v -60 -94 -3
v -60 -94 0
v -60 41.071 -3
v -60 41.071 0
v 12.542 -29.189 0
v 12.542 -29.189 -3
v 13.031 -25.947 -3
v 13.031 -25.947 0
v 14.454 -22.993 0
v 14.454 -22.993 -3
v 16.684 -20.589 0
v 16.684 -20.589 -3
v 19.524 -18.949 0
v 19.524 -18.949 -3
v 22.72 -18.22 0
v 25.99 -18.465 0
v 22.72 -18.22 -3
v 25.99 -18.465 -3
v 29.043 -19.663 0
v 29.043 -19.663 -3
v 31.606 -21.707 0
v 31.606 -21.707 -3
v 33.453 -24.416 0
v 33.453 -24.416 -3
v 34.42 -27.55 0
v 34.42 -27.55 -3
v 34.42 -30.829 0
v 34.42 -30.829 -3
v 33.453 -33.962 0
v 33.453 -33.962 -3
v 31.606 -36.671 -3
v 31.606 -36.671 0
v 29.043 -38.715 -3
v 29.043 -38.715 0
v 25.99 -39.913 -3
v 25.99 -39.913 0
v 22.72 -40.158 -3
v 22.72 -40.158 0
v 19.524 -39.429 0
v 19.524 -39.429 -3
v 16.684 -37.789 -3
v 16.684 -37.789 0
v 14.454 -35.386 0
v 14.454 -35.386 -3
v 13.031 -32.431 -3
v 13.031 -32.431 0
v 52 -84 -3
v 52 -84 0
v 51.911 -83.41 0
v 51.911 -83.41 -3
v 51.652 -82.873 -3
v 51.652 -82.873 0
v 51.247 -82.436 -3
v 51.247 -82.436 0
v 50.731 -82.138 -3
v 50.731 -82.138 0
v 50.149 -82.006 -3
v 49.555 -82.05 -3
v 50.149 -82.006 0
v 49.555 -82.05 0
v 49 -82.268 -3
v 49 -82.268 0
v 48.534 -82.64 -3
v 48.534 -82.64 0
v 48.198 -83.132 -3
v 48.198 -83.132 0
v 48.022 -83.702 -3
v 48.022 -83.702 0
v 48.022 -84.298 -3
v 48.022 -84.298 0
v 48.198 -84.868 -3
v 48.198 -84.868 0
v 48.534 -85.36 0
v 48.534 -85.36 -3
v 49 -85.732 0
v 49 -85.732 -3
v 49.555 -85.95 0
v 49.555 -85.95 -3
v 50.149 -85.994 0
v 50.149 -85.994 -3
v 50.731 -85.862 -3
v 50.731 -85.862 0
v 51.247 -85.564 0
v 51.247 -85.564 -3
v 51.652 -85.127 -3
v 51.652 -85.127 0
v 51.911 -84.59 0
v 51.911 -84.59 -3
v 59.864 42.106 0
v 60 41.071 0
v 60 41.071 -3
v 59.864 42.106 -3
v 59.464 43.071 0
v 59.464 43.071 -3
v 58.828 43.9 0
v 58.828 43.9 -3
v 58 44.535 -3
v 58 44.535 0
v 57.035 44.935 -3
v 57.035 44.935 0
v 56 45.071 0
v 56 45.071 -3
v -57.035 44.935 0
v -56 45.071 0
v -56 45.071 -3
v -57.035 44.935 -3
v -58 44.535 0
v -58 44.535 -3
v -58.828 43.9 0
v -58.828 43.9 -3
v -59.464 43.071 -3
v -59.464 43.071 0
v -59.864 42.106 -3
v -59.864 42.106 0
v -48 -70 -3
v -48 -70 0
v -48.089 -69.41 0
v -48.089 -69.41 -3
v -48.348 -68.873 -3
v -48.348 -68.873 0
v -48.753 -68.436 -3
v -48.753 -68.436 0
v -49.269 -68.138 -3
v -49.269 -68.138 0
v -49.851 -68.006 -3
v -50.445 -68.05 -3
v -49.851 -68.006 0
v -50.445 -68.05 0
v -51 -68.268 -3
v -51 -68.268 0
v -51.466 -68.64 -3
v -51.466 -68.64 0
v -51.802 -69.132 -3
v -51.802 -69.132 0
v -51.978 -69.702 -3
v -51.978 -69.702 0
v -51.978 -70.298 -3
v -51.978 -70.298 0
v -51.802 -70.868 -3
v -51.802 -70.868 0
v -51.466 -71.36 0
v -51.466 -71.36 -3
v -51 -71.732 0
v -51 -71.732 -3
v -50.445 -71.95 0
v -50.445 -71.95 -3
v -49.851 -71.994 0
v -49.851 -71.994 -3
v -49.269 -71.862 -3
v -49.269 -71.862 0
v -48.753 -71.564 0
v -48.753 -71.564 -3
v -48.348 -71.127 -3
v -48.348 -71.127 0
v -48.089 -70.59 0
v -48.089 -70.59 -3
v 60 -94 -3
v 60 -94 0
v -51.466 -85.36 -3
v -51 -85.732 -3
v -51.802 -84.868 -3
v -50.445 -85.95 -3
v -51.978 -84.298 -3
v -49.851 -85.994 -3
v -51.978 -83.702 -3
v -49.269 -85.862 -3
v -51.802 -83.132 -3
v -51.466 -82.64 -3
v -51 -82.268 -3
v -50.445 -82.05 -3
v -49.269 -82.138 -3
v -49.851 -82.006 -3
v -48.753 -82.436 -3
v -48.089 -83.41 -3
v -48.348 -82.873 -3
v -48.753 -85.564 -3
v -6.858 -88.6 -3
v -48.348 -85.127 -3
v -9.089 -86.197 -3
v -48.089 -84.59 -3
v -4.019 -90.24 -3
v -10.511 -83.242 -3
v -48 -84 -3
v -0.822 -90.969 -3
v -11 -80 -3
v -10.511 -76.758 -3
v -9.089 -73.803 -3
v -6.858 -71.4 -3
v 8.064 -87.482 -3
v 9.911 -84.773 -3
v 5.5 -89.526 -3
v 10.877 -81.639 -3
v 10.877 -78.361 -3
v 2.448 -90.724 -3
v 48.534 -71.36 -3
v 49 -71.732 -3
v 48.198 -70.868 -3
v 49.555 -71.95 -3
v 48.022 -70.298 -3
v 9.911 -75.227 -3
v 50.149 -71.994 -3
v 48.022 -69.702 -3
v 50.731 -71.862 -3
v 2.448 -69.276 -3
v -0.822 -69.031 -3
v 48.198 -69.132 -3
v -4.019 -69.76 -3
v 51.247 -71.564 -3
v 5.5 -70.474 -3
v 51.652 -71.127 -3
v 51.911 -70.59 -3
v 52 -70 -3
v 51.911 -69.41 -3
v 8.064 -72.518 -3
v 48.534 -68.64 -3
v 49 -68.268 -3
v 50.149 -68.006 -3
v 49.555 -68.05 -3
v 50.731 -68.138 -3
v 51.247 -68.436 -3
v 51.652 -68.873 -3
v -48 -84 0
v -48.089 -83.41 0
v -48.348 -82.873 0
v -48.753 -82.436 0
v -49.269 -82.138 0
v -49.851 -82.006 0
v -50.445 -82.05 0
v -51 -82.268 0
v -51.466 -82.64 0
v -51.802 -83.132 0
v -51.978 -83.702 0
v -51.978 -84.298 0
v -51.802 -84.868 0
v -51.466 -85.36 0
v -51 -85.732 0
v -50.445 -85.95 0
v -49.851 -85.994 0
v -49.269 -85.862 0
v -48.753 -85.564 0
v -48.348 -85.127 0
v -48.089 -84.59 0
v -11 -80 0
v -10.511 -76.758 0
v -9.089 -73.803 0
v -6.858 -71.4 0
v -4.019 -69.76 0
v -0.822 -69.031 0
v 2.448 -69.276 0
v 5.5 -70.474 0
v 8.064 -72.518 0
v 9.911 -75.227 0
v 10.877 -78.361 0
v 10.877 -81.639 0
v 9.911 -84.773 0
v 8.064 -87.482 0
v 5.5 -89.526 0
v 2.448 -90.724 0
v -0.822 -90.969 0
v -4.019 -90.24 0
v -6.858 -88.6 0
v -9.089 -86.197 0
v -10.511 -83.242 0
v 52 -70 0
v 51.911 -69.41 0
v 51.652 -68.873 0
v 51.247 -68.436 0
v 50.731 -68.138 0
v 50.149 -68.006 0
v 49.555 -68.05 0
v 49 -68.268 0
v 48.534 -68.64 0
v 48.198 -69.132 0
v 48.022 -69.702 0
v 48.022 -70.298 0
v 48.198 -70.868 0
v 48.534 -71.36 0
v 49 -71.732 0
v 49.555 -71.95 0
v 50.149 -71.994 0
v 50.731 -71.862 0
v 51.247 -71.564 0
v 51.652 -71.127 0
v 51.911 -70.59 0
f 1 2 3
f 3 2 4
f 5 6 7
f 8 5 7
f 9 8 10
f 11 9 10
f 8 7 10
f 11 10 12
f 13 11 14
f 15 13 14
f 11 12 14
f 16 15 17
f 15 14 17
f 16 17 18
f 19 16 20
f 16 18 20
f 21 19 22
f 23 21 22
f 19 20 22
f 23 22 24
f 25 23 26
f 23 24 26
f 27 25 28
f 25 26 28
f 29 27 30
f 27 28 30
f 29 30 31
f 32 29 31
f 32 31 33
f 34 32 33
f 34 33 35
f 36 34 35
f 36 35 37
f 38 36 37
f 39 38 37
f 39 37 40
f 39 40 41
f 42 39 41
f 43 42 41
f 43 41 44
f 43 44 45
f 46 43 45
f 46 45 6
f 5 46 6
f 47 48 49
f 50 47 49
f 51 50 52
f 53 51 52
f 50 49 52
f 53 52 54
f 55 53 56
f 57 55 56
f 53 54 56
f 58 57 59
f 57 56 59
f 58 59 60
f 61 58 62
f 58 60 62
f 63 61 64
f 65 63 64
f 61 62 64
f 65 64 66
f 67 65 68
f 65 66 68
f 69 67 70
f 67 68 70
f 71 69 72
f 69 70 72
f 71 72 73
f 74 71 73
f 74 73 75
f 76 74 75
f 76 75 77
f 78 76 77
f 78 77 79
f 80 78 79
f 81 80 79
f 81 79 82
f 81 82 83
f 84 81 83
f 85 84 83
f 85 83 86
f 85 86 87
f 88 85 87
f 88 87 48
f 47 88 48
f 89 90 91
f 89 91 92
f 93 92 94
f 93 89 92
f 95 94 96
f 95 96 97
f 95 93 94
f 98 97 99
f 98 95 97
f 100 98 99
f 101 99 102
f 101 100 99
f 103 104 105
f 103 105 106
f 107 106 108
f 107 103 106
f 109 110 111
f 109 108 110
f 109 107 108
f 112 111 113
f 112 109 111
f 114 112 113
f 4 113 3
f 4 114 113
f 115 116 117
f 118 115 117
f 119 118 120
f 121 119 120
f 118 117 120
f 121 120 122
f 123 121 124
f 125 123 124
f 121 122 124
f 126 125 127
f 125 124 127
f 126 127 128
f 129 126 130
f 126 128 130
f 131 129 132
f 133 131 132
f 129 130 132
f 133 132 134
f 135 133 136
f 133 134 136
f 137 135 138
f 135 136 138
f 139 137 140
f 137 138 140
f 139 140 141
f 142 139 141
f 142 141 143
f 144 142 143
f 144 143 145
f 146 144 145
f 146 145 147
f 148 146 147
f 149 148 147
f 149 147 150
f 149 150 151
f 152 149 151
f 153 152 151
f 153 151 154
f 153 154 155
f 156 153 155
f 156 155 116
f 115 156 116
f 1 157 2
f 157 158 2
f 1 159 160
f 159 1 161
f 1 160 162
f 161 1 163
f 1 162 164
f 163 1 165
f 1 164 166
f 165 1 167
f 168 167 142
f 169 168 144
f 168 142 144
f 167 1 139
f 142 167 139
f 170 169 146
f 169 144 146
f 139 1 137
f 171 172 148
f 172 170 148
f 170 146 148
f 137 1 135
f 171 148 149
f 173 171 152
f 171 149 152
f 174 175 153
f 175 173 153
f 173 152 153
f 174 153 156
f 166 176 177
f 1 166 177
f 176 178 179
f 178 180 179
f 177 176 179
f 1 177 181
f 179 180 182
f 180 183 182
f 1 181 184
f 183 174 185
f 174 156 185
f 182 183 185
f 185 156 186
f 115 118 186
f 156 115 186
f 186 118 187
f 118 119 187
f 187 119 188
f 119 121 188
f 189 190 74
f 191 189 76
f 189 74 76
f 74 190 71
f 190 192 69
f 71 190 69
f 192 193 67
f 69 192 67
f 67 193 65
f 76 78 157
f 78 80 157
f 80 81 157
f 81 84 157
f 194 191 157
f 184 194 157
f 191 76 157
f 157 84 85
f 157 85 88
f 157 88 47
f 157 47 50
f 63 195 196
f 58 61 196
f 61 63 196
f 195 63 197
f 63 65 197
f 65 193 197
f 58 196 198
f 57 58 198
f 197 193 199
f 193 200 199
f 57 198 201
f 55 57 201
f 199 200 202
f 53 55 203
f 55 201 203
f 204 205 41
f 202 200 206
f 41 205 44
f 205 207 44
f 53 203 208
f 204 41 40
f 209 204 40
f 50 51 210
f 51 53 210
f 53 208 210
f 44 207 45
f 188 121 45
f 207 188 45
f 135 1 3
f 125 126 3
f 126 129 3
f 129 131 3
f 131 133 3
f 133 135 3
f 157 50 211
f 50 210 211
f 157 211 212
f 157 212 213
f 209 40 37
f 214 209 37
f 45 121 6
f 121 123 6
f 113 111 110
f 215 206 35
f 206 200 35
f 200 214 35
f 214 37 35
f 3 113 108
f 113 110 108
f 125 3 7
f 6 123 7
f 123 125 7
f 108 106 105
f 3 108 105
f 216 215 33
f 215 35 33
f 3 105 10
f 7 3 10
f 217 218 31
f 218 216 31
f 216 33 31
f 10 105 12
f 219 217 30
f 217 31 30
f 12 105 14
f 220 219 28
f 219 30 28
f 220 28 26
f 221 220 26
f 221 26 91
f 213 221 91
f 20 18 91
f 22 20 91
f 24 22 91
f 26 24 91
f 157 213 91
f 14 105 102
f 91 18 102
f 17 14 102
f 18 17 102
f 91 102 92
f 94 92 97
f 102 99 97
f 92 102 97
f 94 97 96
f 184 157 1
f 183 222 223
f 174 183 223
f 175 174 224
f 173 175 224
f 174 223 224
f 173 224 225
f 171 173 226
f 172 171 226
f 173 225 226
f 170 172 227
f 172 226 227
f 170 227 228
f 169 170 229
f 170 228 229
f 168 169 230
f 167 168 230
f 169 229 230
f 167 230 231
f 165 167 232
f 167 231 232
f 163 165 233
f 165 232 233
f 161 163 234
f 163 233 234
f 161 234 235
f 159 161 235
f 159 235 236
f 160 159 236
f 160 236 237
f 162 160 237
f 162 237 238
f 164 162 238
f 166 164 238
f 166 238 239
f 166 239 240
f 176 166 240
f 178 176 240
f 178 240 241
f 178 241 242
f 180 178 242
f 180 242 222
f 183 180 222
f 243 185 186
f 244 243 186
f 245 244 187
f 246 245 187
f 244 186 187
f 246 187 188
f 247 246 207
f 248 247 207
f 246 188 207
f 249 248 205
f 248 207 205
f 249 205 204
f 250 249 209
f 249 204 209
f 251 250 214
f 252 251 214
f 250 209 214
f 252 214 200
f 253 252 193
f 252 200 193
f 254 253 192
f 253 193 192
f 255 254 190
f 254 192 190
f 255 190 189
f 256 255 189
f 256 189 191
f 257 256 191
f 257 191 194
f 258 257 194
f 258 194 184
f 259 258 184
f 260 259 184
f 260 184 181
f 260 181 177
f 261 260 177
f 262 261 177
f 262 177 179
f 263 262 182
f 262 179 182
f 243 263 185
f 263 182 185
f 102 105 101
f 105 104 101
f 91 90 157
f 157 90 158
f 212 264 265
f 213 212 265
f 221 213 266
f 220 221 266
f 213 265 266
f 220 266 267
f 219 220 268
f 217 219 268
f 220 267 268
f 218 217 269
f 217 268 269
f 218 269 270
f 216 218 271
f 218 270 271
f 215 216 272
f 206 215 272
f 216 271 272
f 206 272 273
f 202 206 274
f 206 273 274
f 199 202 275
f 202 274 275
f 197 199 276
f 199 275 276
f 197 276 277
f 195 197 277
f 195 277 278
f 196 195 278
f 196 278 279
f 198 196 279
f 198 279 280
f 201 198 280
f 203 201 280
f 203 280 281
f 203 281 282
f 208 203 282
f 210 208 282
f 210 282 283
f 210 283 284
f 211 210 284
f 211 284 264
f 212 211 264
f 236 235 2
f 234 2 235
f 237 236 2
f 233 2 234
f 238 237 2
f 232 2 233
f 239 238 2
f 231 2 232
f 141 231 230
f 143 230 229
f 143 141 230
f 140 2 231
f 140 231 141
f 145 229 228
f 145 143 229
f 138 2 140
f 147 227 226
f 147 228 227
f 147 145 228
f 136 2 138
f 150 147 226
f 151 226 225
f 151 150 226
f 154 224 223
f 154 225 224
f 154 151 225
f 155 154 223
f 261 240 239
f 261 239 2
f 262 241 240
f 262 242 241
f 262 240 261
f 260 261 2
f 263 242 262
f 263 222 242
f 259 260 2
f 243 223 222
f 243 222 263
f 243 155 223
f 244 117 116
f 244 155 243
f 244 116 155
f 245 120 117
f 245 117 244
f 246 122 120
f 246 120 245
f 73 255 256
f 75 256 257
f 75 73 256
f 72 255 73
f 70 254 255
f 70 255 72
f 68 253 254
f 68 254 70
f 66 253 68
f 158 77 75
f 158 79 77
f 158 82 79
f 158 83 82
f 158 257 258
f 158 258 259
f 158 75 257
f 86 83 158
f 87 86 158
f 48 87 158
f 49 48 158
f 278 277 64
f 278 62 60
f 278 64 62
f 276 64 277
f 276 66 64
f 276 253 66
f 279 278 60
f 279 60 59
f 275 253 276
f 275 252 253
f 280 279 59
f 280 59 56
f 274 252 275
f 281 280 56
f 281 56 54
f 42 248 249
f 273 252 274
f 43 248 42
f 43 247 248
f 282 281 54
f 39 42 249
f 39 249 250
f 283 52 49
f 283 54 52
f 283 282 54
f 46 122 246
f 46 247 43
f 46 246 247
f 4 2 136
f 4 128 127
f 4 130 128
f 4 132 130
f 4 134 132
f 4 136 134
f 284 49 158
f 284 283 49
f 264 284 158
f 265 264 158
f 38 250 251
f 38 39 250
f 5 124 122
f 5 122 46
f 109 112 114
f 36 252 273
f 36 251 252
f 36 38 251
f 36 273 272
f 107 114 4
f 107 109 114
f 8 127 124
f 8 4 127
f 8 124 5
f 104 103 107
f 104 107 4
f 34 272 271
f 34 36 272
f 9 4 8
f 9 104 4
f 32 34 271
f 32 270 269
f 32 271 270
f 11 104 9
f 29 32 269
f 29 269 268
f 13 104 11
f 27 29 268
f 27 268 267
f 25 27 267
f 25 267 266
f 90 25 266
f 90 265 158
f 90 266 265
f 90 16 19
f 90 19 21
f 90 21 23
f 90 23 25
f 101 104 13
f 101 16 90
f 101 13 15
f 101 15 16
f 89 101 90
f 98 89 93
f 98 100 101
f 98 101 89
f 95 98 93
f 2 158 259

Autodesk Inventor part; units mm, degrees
ref_plane "YZ Plane" through (0, 0, 0) normal (1, 0, 0) x (0, 1, 0)
ref_plane "XZ Plane" through (0, 0, 0) normal (0, 1, 0) x (-1, 0, 0)
ref_plane "XY Plane" through (0, 0, 0) normal (0, 0, 1) x (1, 0, 0)
sketch "スケッチ1" plane through (0, 0, 0) normal (0, 0, 1) x (1, 0, 0)
  circle A0 centre (0, 0) radius 7.5
  circle A1 centre (0, 0) radius 30
  circle A2 centre (0, 0) radius 37.5
  circle A3 centre (23.5425, -29.1891) radius 30
  circle A4 centre (23.5425, -29.1891) radius 4
  circle A5 centre (23.5425, -29.1891) radius 16
  circle A6 centre (23.5425, -29.1891) radius 56
  circle A7 centre (0, -80) radius 40
  circle A8 centre (0, -80) radius 50
  circle A9 centre (0, -80) radius 4
  dimension "d57" = 75
  dimension "d64" = 112
  dimension "d41" = 15
  dimension "d58" = 8
  dimension "d63" = 32
  dimension "d65" = 100
  dimension "d66" = 8
sketch "スケッチ2" plane through (0, 0, 0) normal (0, 0, 1) x (1, 0, 0)
  line L0 (0, 0) -> (24.502, 0) construction
  line L1 (0, 0) -> (12.5, 0) construction
  line L2 (0, 0) -> (10.253, 10.253)
  line L3 (0, 0) -> (14.5, 0) construction
  line L4 (10.253, 10.253) -> (-10.253, -10.253)
  circle A0 centre (10.253, 10.253) radius 2
  circle A1 centre (-10.253, -10.253) radius 2
  circle A2 centre (0, 0) radius 7.5
  line L5 (0, 0) -> (28.1908, 10.2606)
  line L6 (0, 0) -> (30, 0) construction
  line L7 (0, 0) -> (-28.1908, 10.2606)
  line L8 (0, 0) -> (30, 0) construction
  circle A3 centre (-28.1908, 10.2606) radius 2.5
  line L9 (0, 0) -> (0, 30)
  circle A4 centre (0, 30) radius 2.5
  circle A5 centre (28.1908, 10.2606) radius 2.5
  dimension "d9" = 14.5
  dimension "d10" = 45
  dimension "d11" = 29
  dimension "d12" = 4
  dimension "d13" = 4
  dimension "d14" = 15
  dimension "d15" = 30
  dimension "d16" = 20
  dimension "d17" = 30
  dimension "d18" = 160
  dimension "d19" = 5
  dimension "d20" = 30
  dimension "d21" = 5
  dimension "d22" = 5
sketch "スケッチ3" plane through (0, 0, 0) normal (0, 0, 1) x (1, 0, 0)
  line L0 (60, -99.3436) -> (-60, -99.3436)
  line L1 (-60, -99.3436) -> (-60, 99.3436)
  line L2 (-60, 99.3436) -> (60, 99.3436)
  line L3 (60, 99.3436) -> (60, -99.3436)
  line L4 (60, -99.3436) -> (-60, 99.3436) construction
  line L5 (-60, -99.3436) -> (60, 99.3436) construction
  point P0 (0, 0)
  dimension "d25" = 120
extrude "押し出し1" add sketch "スケッチ3" against normal blind 3
sketch "スケッチ4" plane through (0, 0, 0) normal (0, 0, 1) x (1, 0, 0)
  line L0 (0, 45.0711) -> (68.3595, 45.0711)
  line L1 (68.3595, 45.0711) -> (-74.3824, 45.0711)
  line L2 (-74.3824, 45.0711) -> (108.1656, 45.0711)
  line L3 (108.1656, 45.0711) -> (108.1656, 129.4154)
  line L4 (108.1656, 129.4154) -> (-74.3824, 129.4154)
  line L5 (-74.3824, 129.4154) -> (-74.3824, 45.0711)
  point P0 (0, 0)
extrude "押し出し4" cut sketch "スケッチ4" against normal blind 10
fillet "フィレット1" radius 4 4 edges at (-60, 45.0711, -1.5) (60, 45.0711, -1.5) (-60, -99.3436, -1.5) (60, -99.3436, -1.5)
extrude "押し出し9" cut sketch "スケッチ1" against normal blind 10 contours A4 A2 | A2 A4 | A9 A6 | A6 A9
sketch "スケッチ8" plane through (0, 0, 0) normal (0, 0, 1) x (1, 0, 0)
  line L0 (-265.6992, -158.784) -> (100.3409, -158.784)
  line L1 (100.3409, -158.784) -> (100.3409, -94)
  line L2 (100.3409, -94) -> (-265.6992, -94)
  line L3 (-265.6992, -94) -> (-265.6992, -158.784)
  line L4 (-265.6992, -158.784) -> (100.3409, -94) construction
  line L5 (100.3409, -158.784) -> (-265.6992, -94) construction
  point P0 (0, 0)
  point P1 (0, -94)
  point P2 (-82.6791, -126.392)
extrude "押し出し10" cut sketch "スケッチ8" against normal blind 10
sketch "スケッチ9" plane through (0, 0, 0) normal (0, 0, 1) x (1, 0, 0)
  circle A0 centre (-50, -84) radius 2
  circle A1 centre (50, -84) radius 2
  circle A2 centre (-50, -70) radius 2
  circle A3 centre (50, -70) radius 2
  point P0 (0, 0)
  dimension "d73" = 4
  dimension "d74" = 4
  dimension "d75" = 4
  dimension "d76" = 4
extrude "押し出し12" cut sketch "スケッチ9" against normal blind 10
sketch "スケッチ10" plane through (0, 0, -3) normal (0, 0, -1) x (-1, 0, 0)
  circle A0 centre (-23.5425, -29.1891) radius 4 projected
  circle A1 centre (-23.5425, -29.1891) radius 11
  circle A2 centre (0, -80) radius 4 projected
  circle A3 centre (0, -80) radius 11
  point P0 (0, 0)
  dimension "d79" = 22
  dimension "d80" = 22
extrude "押し出し13" cut sketch "スケッチ10" against normal blind 10
properties part number "板3" material "アルミニウム 6061"
